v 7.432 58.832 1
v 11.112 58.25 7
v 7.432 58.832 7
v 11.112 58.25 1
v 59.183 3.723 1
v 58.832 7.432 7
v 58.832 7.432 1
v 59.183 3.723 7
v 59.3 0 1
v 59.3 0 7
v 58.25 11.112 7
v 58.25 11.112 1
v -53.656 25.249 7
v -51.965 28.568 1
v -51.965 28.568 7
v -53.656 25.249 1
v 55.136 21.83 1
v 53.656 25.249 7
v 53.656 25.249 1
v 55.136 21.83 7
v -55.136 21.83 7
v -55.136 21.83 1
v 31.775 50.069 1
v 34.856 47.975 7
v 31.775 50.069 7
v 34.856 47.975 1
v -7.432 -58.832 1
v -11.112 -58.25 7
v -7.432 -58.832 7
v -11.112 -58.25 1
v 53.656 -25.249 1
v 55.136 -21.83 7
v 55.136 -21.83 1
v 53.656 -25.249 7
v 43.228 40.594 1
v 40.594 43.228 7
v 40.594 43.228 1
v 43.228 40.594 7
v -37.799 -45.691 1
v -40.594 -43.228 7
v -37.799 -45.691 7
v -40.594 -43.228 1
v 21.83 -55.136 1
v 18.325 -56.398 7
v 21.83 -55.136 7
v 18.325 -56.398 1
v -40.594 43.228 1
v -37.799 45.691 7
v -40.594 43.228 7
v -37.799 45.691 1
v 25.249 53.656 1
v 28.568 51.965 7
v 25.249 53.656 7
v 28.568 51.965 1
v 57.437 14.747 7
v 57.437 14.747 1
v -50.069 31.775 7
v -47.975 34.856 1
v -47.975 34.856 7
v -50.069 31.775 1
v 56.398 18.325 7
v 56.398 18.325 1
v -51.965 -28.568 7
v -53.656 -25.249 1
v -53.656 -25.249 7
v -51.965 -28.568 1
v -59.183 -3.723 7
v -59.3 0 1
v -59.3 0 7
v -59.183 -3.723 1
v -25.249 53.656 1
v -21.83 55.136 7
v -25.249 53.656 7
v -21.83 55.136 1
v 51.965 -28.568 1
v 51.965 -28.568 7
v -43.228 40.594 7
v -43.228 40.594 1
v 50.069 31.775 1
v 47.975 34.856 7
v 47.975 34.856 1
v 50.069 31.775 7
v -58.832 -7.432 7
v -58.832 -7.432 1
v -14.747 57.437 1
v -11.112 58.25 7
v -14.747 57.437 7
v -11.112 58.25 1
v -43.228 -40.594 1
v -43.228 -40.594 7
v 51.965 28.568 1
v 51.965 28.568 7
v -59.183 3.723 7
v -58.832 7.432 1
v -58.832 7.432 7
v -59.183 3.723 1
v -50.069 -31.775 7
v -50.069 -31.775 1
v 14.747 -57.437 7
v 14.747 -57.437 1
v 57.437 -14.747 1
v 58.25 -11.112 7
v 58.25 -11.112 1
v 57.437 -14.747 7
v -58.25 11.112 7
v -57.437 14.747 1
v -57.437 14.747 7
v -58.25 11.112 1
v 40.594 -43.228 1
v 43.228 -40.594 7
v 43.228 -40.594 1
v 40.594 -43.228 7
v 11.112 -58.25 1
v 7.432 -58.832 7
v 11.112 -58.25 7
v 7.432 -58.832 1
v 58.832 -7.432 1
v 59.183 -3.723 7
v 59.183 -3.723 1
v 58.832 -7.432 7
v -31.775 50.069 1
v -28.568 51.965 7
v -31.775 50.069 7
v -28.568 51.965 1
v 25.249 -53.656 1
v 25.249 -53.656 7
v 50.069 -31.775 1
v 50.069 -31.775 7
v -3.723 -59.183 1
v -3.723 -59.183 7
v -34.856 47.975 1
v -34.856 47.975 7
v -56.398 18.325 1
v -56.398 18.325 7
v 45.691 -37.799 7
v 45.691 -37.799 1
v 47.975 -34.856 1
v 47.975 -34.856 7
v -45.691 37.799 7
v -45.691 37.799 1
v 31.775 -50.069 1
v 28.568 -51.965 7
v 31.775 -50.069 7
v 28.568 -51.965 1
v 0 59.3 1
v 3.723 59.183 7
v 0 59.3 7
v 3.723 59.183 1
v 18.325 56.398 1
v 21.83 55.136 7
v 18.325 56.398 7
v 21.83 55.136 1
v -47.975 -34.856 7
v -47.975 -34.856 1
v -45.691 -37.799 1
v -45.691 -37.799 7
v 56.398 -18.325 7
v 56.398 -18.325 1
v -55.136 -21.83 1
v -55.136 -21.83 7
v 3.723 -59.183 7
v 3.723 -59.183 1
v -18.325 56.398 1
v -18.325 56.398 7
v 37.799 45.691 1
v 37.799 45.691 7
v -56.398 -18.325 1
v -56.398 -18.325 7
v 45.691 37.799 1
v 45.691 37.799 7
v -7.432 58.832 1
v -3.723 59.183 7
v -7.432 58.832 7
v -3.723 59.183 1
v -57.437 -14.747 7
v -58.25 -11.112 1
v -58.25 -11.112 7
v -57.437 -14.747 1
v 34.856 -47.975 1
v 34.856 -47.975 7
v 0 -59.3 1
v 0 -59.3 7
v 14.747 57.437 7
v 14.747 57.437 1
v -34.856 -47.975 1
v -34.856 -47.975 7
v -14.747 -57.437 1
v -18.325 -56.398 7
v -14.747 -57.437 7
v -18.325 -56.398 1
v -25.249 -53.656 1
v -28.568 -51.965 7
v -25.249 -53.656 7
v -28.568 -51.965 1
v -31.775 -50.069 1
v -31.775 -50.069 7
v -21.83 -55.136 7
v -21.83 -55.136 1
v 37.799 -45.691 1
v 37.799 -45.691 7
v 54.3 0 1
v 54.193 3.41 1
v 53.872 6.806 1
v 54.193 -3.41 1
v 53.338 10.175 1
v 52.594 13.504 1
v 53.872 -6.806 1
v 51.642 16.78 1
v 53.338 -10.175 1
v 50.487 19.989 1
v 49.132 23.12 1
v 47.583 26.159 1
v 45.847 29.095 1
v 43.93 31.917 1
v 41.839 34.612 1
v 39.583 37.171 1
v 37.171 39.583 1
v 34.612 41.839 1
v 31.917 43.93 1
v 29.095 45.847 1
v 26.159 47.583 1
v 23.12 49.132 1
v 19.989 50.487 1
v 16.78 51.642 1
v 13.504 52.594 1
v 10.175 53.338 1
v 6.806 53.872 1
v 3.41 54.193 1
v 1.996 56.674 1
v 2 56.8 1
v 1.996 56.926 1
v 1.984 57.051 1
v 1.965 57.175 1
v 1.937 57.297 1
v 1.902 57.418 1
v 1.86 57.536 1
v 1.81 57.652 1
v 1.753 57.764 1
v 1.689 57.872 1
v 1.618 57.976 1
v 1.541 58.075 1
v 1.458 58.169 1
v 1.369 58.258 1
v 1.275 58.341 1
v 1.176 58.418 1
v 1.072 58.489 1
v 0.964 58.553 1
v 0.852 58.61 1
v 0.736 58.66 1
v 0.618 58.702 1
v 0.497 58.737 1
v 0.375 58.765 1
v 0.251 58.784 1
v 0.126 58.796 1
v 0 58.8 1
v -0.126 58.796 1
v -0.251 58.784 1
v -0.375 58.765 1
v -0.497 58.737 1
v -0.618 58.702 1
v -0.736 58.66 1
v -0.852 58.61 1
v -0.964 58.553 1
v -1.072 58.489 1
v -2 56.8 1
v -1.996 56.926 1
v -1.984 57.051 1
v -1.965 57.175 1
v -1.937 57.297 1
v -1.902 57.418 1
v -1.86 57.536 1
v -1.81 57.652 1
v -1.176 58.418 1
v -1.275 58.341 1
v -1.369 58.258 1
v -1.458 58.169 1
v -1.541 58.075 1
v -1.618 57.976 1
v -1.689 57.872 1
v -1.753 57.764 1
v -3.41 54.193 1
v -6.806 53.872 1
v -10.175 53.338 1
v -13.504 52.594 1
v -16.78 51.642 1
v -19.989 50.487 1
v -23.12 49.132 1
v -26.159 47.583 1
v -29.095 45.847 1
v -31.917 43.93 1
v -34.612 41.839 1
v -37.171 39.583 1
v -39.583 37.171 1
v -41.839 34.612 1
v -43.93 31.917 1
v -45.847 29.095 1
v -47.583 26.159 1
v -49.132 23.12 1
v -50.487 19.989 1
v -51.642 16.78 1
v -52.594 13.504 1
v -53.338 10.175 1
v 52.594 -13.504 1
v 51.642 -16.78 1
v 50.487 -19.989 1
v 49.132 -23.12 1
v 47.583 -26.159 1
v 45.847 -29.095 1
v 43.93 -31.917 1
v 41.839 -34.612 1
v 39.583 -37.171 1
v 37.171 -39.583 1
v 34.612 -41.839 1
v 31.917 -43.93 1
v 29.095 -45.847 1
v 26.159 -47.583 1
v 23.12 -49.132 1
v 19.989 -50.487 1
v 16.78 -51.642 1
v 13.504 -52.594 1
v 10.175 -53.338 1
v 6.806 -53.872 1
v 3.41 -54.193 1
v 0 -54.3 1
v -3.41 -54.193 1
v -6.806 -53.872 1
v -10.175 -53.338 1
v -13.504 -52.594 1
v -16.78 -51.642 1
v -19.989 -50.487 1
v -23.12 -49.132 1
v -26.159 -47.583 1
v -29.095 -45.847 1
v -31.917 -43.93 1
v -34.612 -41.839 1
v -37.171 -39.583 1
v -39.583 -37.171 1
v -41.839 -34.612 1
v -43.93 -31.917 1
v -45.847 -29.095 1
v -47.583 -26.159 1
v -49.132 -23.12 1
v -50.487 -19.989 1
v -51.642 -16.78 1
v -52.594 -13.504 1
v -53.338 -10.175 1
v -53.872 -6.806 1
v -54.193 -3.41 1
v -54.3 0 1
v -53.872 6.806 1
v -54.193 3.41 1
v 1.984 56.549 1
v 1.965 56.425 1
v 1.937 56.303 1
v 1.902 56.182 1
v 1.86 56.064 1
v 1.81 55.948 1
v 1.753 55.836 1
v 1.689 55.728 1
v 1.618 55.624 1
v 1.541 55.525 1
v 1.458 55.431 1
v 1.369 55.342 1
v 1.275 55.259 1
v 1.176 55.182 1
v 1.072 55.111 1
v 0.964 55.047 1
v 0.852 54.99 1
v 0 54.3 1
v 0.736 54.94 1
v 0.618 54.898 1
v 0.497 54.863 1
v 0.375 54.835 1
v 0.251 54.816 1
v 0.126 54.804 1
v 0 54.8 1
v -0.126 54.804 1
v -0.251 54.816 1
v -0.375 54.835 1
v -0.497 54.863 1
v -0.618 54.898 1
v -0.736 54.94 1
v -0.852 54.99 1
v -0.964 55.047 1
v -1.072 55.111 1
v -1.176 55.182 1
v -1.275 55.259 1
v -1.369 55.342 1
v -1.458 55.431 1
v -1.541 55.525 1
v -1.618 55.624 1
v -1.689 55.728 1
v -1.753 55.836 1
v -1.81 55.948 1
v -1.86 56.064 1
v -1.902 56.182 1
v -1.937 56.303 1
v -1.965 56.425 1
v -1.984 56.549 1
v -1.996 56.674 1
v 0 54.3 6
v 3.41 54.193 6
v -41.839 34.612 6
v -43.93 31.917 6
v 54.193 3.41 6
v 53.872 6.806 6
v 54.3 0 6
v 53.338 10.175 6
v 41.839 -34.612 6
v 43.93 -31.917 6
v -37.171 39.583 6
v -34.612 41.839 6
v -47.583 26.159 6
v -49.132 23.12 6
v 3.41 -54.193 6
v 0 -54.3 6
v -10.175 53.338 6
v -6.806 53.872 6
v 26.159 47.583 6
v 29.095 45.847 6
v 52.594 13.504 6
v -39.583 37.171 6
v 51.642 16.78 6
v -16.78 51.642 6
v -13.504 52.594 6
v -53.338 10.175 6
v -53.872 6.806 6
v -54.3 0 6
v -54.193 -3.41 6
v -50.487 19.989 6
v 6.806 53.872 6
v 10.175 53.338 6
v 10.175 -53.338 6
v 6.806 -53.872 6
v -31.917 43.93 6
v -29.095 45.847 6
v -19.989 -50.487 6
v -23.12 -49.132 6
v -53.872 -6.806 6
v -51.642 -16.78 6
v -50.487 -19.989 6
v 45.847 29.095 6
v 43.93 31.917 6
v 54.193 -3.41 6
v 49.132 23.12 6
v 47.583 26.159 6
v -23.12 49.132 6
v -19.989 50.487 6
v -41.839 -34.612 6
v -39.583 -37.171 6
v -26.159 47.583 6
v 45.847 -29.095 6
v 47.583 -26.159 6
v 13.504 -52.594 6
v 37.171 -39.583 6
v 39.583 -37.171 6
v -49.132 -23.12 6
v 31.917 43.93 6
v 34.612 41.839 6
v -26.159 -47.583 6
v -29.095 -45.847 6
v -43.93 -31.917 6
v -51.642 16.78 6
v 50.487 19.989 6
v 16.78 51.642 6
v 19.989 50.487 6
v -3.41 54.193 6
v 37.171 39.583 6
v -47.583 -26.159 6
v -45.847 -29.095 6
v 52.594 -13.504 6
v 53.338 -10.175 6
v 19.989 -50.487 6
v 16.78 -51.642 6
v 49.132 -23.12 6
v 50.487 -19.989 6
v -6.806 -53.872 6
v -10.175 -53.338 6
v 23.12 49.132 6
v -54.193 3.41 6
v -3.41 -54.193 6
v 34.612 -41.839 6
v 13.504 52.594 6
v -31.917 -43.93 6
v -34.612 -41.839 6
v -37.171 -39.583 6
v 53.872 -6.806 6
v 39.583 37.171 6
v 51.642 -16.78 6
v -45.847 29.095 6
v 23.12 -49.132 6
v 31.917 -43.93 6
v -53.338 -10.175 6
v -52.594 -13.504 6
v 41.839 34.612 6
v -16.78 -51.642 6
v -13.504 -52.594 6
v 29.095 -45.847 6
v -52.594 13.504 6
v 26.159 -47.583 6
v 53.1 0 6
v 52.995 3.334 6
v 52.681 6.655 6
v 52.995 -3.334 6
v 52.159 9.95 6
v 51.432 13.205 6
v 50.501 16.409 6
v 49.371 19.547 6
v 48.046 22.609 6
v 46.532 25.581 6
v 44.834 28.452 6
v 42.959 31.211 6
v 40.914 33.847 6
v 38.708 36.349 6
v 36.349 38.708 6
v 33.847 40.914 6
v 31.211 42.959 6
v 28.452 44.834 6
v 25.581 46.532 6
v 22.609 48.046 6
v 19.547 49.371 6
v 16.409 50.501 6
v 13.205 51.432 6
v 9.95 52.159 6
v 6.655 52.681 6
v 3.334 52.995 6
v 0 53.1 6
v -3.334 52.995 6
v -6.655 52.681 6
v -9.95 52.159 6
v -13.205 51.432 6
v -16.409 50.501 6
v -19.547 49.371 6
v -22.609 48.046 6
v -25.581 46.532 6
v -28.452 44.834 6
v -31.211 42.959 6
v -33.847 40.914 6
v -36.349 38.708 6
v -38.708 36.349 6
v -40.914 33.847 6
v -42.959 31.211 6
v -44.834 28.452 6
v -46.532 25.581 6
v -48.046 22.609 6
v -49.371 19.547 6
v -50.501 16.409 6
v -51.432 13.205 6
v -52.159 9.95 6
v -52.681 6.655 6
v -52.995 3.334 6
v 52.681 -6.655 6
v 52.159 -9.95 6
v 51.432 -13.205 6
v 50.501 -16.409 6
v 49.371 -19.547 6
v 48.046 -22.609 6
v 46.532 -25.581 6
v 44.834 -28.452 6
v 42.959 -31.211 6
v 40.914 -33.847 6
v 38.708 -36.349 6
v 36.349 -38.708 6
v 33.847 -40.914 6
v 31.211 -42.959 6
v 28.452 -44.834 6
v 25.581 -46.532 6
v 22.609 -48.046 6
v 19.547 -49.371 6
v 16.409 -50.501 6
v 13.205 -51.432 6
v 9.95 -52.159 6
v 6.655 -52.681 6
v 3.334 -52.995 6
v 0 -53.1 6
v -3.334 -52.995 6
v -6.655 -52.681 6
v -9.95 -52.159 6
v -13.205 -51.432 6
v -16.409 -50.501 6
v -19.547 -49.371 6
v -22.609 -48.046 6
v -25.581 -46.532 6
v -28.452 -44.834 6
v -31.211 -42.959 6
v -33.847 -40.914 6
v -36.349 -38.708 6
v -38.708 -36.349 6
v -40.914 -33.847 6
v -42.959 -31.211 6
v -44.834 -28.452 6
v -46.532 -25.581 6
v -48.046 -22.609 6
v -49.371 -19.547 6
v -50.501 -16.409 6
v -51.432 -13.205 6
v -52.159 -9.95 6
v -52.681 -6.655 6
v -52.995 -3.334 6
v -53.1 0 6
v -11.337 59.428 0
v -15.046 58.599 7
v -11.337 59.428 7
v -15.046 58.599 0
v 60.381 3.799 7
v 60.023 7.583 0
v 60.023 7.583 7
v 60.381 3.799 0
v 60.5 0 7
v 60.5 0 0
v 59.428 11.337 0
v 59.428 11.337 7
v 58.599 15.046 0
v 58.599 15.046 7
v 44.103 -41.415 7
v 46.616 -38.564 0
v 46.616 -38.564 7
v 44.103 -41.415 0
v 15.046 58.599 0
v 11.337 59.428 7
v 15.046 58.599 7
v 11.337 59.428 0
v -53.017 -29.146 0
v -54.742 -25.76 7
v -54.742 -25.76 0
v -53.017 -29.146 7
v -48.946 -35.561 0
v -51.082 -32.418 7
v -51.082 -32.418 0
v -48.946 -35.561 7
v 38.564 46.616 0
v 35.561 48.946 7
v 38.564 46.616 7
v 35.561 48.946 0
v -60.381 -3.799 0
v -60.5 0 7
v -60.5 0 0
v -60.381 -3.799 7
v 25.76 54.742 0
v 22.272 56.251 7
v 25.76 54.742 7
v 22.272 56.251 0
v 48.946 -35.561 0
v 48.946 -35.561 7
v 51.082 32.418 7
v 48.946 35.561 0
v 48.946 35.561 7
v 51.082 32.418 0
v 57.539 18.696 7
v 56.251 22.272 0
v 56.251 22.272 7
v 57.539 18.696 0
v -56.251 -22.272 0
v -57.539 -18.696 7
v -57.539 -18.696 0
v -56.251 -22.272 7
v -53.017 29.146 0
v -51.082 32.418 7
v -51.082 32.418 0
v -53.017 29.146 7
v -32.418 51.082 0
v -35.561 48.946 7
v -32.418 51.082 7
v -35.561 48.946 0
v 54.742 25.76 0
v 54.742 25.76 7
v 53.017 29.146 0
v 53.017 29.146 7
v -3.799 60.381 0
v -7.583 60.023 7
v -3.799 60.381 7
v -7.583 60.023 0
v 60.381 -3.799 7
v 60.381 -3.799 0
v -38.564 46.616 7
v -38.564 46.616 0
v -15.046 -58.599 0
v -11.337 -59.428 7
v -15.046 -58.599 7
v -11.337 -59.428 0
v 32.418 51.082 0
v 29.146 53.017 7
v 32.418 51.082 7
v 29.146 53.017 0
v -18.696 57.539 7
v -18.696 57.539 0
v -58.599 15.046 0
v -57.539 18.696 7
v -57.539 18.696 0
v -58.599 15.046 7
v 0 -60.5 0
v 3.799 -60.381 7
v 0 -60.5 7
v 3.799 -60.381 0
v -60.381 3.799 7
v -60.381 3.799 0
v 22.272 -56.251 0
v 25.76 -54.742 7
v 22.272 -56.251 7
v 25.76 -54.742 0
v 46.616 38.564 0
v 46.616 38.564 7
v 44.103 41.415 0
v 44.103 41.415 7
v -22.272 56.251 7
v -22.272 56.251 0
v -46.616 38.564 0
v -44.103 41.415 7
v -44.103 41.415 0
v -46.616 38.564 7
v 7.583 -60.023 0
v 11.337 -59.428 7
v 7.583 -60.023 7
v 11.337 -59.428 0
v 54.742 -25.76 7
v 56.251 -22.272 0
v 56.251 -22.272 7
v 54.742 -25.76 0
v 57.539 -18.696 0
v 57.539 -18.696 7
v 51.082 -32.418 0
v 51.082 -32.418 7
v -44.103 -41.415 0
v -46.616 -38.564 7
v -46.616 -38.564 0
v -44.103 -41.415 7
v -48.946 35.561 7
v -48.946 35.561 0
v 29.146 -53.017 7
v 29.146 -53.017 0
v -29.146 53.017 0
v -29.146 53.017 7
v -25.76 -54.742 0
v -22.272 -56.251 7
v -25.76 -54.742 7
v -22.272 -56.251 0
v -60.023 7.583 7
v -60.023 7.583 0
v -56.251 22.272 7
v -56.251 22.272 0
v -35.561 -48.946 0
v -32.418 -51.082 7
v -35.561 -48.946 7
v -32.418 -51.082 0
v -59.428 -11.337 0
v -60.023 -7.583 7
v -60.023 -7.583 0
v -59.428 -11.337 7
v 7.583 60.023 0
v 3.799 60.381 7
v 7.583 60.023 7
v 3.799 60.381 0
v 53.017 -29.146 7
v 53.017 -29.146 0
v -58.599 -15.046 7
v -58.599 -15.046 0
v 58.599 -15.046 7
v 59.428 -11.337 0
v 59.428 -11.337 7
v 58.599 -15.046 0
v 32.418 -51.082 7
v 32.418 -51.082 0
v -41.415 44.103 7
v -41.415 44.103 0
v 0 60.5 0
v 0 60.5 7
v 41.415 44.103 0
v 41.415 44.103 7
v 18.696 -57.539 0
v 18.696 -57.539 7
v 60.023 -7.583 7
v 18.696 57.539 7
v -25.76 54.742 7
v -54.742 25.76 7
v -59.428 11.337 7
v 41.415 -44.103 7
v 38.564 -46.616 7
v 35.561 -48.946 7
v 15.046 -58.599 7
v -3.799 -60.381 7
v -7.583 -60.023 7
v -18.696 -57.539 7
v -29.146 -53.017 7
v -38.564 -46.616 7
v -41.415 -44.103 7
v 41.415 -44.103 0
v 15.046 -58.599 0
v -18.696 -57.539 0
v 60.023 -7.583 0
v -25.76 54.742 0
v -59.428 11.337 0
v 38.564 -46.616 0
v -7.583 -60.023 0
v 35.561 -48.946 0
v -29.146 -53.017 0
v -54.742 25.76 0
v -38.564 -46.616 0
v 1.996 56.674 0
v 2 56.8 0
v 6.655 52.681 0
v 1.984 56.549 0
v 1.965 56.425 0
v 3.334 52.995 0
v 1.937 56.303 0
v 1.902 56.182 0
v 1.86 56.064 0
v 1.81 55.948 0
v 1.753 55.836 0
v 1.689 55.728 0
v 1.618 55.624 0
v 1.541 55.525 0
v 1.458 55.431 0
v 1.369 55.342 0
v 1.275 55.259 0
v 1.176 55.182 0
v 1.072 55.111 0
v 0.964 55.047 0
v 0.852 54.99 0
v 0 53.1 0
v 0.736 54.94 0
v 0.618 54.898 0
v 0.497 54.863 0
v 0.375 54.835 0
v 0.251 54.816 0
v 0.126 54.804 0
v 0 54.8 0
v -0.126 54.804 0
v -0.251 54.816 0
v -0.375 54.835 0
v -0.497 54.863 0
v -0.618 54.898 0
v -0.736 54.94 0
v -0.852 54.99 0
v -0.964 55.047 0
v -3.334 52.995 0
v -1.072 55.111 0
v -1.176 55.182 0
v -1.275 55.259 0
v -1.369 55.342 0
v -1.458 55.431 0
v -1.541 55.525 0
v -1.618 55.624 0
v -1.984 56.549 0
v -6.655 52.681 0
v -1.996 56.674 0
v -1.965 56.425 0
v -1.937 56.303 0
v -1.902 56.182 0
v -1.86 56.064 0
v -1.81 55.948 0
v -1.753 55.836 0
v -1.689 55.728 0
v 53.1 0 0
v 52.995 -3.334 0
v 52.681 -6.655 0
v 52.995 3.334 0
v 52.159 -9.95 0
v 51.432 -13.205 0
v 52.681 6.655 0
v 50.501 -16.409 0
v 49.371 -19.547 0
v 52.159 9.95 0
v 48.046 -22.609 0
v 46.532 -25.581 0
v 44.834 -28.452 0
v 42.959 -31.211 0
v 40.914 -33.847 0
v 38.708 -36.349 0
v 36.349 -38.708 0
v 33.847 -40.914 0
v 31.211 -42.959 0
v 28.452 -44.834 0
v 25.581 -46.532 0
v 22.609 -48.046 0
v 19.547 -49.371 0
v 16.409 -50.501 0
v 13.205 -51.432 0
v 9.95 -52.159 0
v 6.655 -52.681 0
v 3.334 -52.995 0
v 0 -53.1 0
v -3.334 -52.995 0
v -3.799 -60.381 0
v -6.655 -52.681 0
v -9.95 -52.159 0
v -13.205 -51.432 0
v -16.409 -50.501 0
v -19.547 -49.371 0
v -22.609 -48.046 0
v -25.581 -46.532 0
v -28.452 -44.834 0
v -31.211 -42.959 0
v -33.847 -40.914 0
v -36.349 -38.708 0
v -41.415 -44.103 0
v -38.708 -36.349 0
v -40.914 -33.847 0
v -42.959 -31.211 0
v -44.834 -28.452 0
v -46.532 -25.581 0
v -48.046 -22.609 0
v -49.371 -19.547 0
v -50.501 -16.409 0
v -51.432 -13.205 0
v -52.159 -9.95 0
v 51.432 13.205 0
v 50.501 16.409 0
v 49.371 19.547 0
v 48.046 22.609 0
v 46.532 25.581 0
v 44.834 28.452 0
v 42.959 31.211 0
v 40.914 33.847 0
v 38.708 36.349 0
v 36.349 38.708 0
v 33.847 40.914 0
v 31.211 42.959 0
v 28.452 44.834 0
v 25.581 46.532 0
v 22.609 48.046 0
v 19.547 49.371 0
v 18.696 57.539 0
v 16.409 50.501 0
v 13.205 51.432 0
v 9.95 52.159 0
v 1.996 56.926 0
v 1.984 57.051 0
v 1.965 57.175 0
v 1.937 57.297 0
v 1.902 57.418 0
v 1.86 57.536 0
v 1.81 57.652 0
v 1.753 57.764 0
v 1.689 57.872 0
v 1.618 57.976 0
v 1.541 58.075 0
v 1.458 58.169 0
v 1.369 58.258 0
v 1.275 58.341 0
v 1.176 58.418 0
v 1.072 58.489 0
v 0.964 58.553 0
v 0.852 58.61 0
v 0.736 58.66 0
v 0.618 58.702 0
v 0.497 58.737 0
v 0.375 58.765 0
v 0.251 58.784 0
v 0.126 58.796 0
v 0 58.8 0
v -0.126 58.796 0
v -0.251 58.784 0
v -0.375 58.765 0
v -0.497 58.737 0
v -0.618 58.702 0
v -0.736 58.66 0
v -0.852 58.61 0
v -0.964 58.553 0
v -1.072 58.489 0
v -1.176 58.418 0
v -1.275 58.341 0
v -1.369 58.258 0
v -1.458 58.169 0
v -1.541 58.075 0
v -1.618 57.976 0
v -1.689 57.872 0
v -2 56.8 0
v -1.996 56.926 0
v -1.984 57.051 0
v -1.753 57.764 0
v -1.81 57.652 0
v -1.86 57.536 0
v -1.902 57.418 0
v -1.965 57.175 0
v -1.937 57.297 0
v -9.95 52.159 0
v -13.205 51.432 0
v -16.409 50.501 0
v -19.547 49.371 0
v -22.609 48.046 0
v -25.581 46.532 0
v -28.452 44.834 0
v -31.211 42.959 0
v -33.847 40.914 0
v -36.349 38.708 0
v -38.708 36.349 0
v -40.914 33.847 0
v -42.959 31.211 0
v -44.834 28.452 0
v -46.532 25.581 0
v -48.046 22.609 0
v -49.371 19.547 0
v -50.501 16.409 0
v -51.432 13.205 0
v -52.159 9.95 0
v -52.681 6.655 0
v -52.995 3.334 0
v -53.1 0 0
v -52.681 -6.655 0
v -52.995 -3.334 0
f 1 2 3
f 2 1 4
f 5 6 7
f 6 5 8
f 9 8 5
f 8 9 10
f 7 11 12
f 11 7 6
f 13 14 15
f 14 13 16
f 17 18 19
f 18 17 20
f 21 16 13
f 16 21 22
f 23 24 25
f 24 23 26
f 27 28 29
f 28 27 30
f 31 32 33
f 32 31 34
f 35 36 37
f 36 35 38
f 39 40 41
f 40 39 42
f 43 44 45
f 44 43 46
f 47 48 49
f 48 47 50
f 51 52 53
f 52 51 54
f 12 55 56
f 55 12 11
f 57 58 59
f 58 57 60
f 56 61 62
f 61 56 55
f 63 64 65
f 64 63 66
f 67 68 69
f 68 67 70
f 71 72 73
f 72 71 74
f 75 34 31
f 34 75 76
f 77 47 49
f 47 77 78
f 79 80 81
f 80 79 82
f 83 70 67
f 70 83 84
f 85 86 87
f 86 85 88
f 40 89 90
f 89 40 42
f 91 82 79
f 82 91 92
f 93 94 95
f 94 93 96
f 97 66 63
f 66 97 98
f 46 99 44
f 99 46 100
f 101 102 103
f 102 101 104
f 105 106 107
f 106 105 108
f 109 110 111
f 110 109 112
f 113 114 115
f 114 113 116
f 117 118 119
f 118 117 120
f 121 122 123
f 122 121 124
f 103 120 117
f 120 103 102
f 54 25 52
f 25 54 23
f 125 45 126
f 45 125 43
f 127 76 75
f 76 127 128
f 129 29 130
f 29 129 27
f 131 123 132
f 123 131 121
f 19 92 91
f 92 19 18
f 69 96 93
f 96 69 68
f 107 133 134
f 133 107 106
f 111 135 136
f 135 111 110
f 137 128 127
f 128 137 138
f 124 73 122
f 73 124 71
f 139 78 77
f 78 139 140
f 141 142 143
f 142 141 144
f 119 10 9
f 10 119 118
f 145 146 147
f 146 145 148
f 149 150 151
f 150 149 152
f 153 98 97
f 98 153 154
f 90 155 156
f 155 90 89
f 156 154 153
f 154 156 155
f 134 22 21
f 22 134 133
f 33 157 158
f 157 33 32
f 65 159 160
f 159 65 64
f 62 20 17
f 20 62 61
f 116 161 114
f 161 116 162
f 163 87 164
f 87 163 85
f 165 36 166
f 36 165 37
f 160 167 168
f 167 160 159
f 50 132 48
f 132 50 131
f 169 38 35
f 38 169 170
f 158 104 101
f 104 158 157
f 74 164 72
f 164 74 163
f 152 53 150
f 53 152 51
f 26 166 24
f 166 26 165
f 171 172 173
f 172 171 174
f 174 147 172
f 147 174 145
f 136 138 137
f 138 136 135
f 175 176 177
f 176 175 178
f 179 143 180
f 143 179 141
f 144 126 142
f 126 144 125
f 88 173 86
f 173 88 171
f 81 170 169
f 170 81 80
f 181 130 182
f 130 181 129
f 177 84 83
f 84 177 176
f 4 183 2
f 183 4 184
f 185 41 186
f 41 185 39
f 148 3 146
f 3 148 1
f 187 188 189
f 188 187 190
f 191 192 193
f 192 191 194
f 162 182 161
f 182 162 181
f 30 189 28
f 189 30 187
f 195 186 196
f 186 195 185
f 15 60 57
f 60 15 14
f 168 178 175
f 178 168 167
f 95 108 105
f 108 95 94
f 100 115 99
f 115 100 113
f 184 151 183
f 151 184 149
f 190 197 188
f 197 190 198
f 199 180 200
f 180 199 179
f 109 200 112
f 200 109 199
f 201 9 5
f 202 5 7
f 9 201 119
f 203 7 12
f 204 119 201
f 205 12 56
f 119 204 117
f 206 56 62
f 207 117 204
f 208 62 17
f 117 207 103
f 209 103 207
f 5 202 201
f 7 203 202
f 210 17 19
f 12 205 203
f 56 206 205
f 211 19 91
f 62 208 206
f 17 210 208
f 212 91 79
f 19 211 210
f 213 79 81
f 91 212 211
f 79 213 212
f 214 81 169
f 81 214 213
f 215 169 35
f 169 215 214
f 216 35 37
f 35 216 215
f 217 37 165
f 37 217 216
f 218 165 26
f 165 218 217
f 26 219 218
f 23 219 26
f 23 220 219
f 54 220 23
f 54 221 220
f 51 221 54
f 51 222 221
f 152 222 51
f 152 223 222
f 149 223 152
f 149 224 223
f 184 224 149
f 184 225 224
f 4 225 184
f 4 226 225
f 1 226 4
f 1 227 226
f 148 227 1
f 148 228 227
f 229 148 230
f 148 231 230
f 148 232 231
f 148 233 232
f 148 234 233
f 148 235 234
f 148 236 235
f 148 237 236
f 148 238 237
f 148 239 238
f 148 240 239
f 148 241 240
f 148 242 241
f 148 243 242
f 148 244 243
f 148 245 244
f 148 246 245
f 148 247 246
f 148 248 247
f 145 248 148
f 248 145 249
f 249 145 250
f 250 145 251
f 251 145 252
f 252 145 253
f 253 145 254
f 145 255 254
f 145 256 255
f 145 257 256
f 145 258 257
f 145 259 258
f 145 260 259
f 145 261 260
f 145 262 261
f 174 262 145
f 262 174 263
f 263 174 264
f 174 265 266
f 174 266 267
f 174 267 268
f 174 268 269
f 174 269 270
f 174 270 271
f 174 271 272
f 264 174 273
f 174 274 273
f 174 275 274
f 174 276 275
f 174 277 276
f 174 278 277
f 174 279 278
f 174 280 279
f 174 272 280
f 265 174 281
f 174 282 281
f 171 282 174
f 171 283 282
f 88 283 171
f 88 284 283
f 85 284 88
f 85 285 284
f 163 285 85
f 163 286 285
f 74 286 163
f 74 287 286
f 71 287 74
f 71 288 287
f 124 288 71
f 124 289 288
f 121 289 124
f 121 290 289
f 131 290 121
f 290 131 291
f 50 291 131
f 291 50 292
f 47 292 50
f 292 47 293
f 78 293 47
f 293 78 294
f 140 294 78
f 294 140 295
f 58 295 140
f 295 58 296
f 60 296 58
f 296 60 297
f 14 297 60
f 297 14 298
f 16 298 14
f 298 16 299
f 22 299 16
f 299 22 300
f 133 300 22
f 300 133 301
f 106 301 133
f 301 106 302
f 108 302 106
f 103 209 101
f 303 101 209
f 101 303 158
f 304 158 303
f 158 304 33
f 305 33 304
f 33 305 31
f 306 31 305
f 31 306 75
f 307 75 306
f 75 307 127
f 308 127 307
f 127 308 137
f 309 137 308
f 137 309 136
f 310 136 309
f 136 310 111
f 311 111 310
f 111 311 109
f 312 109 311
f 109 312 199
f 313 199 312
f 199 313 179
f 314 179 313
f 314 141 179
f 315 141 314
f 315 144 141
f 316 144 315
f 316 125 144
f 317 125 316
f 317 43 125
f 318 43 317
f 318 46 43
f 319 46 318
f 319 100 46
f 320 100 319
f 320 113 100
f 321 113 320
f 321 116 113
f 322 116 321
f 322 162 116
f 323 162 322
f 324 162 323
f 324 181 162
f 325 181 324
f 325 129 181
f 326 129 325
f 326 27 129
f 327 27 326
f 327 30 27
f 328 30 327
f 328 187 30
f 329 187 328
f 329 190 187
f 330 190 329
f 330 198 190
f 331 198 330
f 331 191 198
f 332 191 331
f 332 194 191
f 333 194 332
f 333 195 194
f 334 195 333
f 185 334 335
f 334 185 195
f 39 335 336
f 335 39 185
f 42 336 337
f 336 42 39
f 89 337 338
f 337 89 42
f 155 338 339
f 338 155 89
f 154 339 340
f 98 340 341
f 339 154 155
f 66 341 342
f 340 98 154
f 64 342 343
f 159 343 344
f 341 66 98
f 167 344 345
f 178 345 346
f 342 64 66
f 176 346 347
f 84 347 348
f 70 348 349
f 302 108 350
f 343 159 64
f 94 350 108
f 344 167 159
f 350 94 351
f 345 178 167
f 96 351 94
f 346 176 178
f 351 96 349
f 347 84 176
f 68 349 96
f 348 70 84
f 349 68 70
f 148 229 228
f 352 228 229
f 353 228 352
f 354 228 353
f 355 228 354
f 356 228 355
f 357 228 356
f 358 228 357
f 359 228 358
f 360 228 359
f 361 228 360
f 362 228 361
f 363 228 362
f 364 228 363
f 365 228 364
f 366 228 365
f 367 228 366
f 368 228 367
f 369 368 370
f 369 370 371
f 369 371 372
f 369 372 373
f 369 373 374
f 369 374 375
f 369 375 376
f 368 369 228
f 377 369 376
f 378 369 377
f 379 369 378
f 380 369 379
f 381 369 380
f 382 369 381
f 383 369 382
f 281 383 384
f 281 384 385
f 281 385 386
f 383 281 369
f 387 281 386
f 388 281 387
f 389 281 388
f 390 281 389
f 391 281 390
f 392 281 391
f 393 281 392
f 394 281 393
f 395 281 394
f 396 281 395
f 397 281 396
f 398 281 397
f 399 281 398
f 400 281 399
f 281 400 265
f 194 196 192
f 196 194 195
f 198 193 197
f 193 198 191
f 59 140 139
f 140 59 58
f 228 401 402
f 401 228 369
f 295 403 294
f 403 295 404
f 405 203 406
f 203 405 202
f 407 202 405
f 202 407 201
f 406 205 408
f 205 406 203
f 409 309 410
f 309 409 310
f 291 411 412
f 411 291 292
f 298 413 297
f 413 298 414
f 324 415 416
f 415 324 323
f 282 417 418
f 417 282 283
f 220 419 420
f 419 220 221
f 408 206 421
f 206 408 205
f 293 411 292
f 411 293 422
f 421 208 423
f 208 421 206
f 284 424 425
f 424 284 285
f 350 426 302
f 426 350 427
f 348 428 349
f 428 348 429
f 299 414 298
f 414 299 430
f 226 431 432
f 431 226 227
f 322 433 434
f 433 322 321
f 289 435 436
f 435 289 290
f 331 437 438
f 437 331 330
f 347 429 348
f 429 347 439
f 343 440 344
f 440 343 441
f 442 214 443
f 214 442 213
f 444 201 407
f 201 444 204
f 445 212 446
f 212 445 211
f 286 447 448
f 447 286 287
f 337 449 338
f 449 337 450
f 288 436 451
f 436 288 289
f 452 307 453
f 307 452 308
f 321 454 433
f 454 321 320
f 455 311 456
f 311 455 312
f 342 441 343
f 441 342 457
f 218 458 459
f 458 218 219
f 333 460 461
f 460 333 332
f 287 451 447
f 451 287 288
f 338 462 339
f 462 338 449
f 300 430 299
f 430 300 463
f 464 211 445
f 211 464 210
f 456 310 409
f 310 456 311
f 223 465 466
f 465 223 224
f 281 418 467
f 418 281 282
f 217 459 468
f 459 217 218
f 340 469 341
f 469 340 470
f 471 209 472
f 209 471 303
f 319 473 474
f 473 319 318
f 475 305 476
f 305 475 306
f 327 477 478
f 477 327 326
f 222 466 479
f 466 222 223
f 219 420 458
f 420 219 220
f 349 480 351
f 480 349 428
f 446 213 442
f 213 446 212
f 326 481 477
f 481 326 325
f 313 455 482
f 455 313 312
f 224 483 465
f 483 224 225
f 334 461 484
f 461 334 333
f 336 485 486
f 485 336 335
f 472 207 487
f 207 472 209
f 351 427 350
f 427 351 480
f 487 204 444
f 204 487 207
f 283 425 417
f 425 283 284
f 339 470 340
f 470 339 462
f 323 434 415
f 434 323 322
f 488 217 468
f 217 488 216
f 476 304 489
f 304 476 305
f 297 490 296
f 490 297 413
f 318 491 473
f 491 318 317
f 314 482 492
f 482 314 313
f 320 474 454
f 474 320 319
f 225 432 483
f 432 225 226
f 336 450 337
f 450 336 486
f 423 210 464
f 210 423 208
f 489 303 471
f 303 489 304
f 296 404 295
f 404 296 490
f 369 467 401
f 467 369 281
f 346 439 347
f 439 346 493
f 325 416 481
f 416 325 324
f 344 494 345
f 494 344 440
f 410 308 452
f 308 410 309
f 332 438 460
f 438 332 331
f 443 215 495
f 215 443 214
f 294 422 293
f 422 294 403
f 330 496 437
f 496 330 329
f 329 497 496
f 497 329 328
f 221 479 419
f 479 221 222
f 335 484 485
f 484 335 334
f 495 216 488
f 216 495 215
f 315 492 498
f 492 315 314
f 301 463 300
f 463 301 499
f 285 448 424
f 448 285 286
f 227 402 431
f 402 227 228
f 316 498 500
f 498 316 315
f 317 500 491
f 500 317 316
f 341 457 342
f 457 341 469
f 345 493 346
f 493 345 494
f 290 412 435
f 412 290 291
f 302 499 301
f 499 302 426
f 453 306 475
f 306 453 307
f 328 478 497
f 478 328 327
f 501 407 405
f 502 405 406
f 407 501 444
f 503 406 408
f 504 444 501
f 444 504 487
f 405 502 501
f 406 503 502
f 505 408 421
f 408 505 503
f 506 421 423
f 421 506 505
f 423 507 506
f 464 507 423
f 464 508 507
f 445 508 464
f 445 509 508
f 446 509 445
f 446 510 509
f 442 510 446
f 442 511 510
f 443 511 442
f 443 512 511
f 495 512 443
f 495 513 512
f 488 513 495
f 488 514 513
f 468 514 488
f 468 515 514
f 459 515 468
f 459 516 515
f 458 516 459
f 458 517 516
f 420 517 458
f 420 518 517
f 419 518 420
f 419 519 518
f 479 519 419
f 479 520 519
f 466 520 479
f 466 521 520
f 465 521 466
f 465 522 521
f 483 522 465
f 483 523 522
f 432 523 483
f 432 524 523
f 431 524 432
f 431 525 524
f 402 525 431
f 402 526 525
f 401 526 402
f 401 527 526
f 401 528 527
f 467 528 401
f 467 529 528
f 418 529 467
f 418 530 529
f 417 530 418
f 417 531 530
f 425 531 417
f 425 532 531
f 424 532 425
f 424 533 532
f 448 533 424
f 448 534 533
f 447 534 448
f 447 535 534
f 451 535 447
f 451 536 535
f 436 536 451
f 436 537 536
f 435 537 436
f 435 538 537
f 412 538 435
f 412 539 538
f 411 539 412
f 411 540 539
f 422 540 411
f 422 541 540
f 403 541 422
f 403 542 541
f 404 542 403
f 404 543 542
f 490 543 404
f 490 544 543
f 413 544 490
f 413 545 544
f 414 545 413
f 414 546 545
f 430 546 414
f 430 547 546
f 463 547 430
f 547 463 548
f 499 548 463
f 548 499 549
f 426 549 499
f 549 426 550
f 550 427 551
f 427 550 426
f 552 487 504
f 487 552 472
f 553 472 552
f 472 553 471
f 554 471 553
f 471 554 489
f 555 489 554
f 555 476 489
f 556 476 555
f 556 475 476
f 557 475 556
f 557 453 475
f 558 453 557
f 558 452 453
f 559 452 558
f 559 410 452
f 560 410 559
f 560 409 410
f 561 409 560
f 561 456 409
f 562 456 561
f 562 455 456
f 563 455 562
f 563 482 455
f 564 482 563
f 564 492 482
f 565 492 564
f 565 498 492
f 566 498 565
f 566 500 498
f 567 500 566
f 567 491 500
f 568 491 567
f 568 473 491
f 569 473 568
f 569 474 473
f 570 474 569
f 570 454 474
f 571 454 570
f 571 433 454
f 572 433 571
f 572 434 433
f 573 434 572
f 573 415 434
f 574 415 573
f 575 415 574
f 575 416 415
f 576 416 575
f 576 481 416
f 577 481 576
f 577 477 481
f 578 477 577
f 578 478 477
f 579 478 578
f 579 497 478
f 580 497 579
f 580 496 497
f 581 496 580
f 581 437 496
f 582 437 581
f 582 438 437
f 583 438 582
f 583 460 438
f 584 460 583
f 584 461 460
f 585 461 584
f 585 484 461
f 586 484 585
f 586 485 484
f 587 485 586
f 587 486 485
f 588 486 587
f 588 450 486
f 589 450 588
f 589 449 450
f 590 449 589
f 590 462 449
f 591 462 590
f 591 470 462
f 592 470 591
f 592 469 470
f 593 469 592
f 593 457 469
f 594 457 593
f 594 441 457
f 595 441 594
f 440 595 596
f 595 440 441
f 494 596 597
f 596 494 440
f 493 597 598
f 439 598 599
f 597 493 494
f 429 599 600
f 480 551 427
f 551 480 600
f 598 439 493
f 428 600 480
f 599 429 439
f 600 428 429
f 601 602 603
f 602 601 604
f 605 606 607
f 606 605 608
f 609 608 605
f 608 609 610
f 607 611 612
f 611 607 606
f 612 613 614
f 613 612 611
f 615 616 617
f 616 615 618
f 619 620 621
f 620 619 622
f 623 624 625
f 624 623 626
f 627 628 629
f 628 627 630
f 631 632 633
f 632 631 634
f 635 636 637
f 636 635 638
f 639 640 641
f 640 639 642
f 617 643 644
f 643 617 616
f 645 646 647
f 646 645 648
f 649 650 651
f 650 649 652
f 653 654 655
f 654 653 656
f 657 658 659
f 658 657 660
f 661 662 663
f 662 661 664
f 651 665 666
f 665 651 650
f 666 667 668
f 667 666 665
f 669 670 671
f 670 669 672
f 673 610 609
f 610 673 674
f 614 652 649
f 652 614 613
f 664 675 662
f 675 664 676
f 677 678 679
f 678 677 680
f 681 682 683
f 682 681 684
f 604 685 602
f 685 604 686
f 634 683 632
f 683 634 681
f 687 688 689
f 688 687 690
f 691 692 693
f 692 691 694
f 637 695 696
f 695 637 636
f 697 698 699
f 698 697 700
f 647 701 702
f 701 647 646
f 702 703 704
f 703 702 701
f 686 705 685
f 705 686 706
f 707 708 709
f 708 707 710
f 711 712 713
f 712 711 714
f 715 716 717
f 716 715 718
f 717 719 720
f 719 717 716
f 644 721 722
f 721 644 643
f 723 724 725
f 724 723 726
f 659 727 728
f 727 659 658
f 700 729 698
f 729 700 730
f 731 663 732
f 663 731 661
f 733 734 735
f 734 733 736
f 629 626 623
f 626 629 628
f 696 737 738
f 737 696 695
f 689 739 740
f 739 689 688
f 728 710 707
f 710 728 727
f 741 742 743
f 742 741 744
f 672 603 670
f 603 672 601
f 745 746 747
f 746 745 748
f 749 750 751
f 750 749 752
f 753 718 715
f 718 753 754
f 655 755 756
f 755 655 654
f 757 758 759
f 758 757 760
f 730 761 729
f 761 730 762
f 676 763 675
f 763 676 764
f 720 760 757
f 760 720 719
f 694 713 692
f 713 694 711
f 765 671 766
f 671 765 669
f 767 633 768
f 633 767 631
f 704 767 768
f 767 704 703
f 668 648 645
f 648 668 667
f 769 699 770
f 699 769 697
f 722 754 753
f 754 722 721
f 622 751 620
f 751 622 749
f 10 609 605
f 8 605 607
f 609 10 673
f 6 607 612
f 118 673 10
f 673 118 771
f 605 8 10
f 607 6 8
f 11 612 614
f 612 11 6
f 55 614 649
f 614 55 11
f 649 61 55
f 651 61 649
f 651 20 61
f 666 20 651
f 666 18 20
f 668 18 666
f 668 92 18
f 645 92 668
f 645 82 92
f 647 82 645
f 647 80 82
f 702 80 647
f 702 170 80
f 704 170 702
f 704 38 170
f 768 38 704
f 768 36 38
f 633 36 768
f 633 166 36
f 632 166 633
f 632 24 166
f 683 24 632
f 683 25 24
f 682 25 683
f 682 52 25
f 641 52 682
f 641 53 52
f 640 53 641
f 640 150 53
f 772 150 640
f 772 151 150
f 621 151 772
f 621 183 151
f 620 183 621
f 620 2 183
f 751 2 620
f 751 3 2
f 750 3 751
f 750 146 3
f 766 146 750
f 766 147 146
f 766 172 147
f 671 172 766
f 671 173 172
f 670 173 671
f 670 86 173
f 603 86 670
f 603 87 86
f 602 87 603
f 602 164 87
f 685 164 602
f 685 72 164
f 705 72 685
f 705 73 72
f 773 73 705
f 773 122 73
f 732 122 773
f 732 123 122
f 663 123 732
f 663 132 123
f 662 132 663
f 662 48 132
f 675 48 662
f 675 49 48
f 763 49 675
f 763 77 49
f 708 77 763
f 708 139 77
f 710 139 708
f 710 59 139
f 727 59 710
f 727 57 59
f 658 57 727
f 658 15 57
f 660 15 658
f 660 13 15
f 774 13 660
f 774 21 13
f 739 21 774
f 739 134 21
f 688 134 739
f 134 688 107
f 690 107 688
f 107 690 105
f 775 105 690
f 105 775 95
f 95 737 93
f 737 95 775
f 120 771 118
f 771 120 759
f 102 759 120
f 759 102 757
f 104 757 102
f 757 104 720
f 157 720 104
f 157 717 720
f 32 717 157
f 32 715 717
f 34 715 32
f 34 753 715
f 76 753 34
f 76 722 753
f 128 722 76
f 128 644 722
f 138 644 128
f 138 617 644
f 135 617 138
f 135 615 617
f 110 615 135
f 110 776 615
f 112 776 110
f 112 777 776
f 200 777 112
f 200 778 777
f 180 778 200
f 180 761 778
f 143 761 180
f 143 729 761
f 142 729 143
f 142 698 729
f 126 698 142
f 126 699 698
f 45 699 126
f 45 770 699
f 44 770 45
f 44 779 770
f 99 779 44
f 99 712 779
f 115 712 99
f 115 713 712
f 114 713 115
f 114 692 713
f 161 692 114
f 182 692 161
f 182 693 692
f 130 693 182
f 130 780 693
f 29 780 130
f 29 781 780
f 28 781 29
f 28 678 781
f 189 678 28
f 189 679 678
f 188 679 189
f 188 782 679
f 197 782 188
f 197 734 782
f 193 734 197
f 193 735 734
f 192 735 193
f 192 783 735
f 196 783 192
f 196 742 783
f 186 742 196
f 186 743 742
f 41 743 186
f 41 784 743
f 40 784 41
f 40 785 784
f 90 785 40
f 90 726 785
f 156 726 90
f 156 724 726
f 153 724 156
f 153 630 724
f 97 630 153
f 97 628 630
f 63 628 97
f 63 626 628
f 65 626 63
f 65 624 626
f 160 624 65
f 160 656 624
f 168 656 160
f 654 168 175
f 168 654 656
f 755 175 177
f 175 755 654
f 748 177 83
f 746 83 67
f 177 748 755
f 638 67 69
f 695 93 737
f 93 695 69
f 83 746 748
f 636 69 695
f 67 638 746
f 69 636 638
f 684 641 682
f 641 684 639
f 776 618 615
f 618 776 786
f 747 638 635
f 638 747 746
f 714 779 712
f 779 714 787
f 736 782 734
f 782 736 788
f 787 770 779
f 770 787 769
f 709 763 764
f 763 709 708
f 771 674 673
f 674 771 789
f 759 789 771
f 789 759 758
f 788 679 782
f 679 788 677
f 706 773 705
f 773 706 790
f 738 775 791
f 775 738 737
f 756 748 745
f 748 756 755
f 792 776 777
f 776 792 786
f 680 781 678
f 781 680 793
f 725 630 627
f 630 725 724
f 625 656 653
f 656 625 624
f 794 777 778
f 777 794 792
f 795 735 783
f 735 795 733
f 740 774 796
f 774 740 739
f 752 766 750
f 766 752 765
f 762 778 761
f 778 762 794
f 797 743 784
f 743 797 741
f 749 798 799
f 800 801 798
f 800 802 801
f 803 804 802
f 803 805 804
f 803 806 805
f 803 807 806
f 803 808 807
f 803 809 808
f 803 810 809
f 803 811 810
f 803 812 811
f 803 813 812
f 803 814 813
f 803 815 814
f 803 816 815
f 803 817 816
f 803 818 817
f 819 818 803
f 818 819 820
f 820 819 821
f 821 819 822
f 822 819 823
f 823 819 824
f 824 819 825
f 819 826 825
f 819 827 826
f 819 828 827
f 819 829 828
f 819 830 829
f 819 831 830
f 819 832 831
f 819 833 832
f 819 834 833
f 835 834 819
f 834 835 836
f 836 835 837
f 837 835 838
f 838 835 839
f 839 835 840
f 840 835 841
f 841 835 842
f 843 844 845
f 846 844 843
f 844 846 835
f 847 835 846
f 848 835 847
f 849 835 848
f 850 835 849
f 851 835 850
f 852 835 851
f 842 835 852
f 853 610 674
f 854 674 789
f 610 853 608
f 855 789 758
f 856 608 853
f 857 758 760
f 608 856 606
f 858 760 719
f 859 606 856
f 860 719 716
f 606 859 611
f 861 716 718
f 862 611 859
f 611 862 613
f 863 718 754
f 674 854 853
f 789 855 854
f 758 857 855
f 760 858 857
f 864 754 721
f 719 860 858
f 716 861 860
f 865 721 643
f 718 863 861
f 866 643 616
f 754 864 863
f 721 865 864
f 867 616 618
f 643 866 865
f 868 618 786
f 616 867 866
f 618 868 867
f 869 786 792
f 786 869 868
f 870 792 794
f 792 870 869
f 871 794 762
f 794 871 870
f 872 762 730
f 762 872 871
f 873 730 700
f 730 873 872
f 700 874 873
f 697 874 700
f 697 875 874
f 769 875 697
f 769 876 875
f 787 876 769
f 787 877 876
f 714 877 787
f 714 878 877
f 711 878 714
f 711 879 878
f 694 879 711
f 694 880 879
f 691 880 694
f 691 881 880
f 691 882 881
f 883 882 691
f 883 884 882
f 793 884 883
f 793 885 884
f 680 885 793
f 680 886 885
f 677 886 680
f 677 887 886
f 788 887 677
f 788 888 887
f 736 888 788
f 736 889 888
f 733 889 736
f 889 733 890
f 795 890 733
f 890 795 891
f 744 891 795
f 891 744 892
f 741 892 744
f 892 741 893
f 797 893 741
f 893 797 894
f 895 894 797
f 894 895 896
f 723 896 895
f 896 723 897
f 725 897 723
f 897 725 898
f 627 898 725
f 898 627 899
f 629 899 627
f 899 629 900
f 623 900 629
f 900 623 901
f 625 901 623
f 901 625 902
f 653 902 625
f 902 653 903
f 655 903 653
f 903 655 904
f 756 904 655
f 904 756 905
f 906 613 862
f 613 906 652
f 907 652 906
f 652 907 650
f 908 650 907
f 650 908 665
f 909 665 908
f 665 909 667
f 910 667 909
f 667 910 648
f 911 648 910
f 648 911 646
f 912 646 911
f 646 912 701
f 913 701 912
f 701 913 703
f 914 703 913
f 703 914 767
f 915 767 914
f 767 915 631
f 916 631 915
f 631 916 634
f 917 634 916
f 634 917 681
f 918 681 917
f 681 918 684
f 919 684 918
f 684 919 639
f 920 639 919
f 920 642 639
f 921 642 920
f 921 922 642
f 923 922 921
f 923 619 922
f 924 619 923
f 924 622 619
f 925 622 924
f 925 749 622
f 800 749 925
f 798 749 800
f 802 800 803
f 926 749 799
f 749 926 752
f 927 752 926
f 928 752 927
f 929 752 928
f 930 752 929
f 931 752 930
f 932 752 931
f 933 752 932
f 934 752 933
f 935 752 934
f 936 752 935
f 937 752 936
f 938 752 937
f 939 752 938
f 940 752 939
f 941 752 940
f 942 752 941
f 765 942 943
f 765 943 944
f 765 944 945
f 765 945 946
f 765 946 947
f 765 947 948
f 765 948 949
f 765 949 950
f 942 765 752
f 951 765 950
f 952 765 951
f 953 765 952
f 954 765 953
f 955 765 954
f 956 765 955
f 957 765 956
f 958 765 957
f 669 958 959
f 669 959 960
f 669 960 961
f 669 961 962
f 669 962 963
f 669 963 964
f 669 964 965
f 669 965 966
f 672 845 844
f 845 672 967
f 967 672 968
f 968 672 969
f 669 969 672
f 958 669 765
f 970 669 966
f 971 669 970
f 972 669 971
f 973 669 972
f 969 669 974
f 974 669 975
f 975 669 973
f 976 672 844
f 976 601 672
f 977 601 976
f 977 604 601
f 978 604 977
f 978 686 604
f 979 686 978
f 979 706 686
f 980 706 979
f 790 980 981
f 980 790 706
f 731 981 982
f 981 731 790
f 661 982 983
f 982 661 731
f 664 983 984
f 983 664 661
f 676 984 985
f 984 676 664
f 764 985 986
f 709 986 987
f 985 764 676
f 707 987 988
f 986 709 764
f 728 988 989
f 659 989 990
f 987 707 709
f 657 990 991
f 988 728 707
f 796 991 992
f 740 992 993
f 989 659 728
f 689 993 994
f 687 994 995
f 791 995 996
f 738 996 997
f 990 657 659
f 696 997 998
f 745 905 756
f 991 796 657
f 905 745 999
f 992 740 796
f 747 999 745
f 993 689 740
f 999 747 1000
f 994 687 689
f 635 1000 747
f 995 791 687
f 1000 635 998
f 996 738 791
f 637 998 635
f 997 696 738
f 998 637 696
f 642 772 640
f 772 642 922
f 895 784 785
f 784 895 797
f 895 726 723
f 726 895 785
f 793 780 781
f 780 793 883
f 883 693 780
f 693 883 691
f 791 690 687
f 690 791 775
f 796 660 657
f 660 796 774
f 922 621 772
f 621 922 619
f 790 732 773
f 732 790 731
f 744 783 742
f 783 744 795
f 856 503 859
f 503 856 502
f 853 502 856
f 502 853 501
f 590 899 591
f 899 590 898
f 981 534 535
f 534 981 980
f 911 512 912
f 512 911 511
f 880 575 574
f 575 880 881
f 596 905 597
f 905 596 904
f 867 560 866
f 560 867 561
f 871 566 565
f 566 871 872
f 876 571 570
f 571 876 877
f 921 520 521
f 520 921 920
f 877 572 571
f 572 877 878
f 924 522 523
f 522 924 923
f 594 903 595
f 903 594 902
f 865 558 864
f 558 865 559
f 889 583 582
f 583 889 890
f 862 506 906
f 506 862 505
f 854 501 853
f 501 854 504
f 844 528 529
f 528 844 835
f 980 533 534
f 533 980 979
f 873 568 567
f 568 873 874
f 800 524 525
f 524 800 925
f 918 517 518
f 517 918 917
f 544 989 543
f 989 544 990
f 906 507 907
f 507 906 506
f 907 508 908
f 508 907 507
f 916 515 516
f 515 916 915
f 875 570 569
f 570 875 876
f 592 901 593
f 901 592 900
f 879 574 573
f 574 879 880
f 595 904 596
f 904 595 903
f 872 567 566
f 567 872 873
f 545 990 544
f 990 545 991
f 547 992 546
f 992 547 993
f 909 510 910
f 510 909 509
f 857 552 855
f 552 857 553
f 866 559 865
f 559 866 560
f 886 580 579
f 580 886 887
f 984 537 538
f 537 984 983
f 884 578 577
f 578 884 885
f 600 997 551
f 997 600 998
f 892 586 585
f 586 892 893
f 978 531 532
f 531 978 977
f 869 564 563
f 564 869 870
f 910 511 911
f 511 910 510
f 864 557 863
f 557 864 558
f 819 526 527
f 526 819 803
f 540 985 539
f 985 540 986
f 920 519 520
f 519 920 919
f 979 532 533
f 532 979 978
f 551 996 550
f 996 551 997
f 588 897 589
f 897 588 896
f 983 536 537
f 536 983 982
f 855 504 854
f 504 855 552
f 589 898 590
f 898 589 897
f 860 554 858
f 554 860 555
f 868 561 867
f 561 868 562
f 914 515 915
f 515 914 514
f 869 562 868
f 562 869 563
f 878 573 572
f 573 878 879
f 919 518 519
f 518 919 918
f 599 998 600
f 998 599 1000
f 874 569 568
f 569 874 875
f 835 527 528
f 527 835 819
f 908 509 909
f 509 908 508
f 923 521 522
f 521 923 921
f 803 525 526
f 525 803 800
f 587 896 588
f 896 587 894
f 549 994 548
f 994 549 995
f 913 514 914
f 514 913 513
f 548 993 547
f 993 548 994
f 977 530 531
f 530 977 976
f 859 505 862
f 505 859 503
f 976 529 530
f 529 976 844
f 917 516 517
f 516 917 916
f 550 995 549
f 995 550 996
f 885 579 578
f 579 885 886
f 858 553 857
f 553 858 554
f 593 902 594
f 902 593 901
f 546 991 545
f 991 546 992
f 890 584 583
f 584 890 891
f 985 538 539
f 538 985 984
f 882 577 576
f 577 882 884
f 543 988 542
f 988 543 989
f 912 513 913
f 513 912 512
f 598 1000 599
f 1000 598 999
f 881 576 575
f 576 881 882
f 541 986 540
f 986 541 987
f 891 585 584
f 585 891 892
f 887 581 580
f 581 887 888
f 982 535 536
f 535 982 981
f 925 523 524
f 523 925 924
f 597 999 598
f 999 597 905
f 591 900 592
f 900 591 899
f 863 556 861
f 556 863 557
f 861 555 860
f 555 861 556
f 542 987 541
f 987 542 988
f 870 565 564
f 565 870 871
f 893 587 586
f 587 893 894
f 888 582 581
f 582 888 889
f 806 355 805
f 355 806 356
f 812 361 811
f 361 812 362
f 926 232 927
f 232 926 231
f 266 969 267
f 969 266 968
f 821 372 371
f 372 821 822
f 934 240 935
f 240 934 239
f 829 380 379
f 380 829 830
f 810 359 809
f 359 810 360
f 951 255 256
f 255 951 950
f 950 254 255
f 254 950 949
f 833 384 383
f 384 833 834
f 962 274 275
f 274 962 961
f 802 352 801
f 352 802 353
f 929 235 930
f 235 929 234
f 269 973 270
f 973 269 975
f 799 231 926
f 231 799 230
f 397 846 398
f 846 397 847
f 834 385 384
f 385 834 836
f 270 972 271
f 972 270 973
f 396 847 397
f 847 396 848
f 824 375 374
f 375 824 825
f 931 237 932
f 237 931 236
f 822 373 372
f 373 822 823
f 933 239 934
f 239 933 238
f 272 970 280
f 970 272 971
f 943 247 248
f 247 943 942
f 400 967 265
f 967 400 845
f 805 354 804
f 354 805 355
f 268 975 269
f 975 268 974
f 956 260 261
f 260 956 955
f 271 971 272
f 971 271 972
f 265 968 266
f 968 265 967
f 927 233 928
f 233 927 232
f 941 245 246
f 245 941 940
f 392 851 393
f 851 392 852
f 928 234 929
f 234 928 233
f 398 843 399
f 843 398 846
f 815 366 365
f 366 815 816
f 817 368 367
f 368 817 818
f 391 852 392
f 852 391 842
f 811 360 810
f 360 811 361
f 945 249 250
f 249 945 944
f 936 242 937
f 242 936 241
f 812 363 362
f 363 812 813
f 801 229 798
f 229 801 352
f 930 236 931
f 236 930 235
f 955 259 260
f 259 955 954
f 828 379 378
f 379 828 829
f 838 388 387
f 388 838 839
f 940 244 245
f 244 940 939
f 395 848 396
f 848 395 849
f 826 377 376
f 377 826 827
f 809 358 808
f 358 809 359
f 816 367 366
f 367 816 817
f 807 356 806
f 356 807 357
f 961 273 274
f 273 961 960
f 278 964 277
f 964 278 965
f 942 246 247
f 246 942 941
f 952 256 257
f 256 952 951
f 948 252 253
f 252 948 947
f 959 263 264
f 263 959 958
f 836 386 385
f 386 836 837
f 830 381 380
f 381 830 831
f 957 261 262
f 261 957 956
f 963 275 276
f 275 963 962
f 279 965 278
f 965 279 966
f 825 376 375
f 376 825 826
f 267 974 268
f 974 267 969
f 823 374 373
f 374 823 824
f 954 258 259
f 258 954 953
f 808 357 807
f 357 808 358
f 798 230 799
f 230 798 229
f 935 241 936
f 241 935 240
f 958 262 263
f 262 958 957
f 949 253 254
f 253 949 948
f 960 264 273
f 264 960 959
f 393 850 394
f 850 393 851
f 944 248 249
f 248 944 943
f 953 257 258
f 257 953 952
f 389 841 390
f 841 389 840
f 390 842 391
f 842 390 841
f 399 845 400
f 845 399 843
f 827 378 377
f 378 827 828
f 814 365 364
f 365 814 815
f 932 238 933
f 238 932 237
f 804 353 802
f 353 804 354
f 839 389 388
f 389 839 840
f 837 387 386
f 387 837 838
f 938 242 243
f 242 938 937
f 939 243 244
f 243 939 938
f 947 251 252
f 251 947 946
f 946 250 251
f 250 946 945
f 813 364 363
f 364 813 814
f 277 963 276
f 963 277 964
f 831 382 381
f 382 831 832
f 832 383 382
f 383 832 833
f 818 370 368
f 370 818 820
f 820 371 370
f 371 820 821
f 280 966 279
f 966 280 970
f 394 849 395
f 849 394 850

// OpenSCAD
//LED neon circle frame
//Two main adjustable variables
thick=5;     //thickness of LED neon
diam=121; //diameter of circular frame
//More specialist variables
wall=1.2;    //wall thickness
height=6;   //depth of groove
$fn=100;    //circle segments
//Don't change variables below here
wl=wall*2;
thk=thick*2;
radius=diam/2;
difference(){
//main disk
cylinder(h=height+1, d=diam);
//central void
translate([0,0,-1])
cylinder(h=height+2, d=diam-thk-(wall*4));
//cable hole
translate([0,radius-wall-(thick/2),-1])
cylinder(h=height+2, d=thick-1);
difference(){
//channel groove outer dimension
translate([0,0,1])
cylinder(h=height+1, d=diam-wl);
//channel groove inner dimension
translate([0,0,-1])
cylinder(h=height+1, d=diam-wl-thk);
}
}
